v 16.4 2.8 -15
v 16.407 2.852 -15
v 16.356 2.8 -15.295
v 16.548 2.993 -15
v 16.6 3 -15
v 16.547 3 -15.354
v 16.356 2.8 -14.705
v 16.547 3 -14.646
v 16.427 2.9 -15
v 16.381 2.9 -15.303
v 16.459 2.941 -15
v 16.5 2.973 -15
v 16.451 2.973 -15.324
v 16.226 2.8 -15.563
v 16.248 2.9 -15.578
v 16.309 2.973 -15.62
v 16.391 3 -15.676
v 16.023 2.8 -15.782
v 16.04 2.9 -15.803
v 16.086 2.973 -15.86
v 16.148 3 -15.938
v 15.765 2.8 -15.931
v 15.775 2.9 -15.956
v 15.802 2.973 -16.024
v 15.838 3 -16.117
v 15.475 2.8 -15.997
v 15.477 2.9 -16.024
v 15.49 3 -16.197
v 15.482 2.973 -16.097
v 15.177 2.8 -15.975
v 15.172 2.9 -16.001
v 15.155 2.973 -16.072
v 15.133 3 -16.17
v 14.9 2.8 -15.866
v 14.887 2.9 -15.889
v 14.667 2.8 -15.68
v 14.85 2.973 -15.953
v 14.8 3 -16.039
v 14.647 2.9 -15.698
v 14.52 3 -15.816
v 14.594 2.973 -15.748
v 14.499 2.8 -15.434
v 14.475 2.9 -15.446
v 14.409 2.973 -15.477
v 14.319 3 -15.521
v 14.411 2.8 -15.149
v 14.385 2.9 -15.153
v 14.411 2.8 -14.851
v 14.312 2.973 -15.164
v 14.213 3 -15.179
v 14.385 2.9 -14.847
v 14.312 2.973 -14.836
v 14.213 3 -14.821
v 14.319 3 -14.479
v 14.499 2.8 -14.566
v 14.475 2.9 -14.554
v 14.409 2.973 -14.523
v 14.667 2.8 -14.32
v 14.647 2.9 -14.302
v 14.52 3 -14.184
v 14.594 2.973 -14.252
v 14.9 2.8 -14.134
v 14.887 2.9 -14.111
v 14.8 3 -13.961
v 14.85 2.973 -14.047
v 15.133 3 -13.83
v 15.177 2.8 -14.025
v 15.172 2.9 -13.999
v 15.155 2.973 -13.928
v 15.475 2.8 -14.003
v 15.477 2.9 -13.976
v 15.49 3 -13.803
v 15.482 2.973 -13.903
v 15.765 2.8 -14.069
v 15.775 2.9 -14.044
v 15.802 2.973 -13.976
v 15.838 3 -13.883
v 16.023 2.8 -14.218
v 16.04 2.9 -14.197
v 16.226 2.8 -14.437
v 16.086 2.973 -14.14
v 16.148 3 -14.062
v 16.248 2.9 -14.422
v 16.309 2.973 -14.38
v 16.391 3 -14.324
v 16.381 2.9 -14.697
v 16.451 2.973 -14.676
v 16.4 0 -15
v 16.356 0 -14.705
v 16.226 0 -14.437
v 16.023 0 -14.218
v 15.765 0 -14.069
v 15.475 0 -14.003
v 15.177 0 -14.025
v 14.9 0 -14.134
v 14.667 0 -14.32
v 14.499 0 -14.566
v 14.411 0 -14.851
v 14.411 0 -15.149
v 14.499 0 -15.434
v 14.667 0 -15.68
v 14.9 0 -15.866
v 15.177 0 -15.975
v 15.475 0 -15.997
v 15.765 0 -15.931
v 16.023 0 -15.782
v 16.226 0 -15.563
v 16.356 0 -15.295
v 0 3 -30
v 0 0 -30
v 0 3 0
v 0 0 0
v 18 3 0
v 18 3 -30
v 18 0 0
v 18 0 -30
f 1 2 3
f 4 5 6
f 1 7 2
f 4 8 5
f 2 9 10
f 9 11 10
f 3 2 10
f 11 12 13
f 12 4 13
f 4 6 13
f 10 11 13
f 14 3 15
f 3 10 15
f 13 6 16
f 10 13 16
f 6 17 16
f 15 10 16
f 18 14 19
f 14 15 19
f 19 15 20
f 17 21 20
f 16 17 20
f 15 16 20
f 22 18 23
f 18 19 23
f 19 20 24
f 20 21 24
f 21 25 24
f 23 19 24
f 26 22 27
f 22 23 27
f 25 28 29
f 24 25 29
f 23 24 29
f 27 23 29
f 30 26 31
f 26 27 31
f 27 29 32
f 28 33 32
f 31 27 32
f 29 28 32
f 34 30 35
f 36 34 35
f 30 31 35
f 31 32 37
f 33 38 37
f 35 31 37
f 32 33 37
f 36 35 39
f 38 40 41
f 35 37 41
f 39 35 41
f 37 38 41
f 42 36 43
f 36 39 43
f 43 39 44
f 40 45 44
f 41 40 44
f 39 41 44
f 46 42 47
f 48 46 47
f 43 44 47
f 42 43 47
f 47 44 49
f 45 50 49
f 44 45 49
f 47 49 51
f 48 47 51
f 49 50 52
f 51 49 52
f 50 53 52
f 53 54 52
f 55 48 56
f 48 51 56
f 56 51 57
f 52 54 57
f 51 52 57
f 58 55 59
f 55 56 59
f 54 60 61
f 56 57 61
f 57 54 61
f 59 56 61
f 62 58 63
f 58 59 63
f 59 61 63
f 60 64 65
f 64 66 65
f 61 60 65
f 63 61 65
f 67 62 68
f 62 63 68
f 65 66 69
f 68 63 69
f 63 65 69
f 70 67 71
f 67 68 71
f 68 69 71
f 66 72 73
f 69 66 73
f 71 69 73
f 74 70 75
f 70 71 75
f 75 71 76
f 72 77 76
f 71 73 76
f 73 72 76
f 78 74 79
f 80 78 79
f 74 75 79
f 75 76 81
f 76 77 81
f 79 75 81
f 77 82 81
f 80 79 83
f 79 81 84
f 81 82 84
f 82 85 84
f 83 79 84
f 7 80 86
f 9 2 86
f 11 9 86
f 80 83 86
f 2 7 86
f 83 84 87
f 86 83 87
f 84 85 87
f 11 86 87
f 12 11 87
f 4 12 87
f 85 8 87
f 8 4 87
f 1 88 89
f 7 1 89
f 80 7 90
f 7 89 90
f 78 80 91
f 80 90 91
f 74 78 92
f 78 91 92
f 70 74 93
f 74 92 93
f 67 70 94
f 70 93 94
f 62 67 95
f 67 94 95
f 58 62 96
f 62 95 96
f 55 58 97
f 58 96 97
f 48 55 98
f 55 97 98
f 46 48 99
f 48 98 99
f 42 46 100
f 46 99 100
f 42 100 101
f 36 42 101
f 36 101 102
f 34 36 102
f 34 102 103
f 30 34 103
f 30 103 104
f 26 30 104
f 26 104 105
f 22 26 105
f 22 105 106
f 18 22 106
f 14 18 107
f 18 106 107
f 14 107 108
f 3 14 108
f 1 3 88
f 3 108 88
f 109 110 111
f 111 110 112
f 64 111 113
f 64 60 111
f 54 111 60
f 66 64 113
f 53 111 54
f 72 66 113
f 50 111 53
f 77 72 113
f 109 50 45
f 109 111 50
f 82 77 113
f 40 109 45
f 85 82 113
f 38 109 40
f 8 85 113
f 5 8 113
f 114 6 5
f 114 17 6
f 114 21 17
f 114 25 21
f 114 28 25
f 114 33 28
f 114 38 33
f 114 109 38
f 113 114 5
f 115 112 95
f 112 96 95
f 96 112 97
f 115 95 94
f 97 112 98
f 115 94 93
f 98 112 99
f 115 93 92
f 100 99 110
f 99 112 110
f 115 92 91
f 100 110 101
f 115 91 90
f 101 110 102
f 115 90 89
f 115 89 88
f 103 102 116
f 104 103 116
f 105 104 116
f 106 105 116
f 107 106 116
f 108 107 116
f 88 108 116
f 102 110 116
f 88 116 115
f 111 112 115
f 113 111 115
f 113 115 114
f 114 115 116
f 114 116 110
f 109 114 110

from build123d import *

# Parameters (mm, degrees)
SKETCH_1_W      = 18
SKETCH_1_H      = 30
SKETCH_1_R      = 1
EXTRUDE_1_DEPTH = 3
FILLET_1_R      = 0.2


with BuildPart() as part:
    # 草图1 → 凸台-拉伸1 (new body)
    with BuildSketch(Plane(origin=(0, 0, 0), x_dir=(1, 0, 0), z_dir=(0, 1, 0))):
        with Locations((9, 15)):
            Rectangle(SKETCH_1_W, SKETCH_1_H)
        with Locations((15.4, 15)):
            Circle(SKETCH_1_R, mode=Mode.SUBTRACT)
    extrude(amount=EXTRUDE_1_DEPTH)

    # 圆角1
    fillet_1_edges = [part.edges().sort_by_distance(p)[0] for p in [
        (14.4, 3, -15),
    ]]
    fillet(fillet_1_edges, radius=FILLET_1_R)


solid = part.part
